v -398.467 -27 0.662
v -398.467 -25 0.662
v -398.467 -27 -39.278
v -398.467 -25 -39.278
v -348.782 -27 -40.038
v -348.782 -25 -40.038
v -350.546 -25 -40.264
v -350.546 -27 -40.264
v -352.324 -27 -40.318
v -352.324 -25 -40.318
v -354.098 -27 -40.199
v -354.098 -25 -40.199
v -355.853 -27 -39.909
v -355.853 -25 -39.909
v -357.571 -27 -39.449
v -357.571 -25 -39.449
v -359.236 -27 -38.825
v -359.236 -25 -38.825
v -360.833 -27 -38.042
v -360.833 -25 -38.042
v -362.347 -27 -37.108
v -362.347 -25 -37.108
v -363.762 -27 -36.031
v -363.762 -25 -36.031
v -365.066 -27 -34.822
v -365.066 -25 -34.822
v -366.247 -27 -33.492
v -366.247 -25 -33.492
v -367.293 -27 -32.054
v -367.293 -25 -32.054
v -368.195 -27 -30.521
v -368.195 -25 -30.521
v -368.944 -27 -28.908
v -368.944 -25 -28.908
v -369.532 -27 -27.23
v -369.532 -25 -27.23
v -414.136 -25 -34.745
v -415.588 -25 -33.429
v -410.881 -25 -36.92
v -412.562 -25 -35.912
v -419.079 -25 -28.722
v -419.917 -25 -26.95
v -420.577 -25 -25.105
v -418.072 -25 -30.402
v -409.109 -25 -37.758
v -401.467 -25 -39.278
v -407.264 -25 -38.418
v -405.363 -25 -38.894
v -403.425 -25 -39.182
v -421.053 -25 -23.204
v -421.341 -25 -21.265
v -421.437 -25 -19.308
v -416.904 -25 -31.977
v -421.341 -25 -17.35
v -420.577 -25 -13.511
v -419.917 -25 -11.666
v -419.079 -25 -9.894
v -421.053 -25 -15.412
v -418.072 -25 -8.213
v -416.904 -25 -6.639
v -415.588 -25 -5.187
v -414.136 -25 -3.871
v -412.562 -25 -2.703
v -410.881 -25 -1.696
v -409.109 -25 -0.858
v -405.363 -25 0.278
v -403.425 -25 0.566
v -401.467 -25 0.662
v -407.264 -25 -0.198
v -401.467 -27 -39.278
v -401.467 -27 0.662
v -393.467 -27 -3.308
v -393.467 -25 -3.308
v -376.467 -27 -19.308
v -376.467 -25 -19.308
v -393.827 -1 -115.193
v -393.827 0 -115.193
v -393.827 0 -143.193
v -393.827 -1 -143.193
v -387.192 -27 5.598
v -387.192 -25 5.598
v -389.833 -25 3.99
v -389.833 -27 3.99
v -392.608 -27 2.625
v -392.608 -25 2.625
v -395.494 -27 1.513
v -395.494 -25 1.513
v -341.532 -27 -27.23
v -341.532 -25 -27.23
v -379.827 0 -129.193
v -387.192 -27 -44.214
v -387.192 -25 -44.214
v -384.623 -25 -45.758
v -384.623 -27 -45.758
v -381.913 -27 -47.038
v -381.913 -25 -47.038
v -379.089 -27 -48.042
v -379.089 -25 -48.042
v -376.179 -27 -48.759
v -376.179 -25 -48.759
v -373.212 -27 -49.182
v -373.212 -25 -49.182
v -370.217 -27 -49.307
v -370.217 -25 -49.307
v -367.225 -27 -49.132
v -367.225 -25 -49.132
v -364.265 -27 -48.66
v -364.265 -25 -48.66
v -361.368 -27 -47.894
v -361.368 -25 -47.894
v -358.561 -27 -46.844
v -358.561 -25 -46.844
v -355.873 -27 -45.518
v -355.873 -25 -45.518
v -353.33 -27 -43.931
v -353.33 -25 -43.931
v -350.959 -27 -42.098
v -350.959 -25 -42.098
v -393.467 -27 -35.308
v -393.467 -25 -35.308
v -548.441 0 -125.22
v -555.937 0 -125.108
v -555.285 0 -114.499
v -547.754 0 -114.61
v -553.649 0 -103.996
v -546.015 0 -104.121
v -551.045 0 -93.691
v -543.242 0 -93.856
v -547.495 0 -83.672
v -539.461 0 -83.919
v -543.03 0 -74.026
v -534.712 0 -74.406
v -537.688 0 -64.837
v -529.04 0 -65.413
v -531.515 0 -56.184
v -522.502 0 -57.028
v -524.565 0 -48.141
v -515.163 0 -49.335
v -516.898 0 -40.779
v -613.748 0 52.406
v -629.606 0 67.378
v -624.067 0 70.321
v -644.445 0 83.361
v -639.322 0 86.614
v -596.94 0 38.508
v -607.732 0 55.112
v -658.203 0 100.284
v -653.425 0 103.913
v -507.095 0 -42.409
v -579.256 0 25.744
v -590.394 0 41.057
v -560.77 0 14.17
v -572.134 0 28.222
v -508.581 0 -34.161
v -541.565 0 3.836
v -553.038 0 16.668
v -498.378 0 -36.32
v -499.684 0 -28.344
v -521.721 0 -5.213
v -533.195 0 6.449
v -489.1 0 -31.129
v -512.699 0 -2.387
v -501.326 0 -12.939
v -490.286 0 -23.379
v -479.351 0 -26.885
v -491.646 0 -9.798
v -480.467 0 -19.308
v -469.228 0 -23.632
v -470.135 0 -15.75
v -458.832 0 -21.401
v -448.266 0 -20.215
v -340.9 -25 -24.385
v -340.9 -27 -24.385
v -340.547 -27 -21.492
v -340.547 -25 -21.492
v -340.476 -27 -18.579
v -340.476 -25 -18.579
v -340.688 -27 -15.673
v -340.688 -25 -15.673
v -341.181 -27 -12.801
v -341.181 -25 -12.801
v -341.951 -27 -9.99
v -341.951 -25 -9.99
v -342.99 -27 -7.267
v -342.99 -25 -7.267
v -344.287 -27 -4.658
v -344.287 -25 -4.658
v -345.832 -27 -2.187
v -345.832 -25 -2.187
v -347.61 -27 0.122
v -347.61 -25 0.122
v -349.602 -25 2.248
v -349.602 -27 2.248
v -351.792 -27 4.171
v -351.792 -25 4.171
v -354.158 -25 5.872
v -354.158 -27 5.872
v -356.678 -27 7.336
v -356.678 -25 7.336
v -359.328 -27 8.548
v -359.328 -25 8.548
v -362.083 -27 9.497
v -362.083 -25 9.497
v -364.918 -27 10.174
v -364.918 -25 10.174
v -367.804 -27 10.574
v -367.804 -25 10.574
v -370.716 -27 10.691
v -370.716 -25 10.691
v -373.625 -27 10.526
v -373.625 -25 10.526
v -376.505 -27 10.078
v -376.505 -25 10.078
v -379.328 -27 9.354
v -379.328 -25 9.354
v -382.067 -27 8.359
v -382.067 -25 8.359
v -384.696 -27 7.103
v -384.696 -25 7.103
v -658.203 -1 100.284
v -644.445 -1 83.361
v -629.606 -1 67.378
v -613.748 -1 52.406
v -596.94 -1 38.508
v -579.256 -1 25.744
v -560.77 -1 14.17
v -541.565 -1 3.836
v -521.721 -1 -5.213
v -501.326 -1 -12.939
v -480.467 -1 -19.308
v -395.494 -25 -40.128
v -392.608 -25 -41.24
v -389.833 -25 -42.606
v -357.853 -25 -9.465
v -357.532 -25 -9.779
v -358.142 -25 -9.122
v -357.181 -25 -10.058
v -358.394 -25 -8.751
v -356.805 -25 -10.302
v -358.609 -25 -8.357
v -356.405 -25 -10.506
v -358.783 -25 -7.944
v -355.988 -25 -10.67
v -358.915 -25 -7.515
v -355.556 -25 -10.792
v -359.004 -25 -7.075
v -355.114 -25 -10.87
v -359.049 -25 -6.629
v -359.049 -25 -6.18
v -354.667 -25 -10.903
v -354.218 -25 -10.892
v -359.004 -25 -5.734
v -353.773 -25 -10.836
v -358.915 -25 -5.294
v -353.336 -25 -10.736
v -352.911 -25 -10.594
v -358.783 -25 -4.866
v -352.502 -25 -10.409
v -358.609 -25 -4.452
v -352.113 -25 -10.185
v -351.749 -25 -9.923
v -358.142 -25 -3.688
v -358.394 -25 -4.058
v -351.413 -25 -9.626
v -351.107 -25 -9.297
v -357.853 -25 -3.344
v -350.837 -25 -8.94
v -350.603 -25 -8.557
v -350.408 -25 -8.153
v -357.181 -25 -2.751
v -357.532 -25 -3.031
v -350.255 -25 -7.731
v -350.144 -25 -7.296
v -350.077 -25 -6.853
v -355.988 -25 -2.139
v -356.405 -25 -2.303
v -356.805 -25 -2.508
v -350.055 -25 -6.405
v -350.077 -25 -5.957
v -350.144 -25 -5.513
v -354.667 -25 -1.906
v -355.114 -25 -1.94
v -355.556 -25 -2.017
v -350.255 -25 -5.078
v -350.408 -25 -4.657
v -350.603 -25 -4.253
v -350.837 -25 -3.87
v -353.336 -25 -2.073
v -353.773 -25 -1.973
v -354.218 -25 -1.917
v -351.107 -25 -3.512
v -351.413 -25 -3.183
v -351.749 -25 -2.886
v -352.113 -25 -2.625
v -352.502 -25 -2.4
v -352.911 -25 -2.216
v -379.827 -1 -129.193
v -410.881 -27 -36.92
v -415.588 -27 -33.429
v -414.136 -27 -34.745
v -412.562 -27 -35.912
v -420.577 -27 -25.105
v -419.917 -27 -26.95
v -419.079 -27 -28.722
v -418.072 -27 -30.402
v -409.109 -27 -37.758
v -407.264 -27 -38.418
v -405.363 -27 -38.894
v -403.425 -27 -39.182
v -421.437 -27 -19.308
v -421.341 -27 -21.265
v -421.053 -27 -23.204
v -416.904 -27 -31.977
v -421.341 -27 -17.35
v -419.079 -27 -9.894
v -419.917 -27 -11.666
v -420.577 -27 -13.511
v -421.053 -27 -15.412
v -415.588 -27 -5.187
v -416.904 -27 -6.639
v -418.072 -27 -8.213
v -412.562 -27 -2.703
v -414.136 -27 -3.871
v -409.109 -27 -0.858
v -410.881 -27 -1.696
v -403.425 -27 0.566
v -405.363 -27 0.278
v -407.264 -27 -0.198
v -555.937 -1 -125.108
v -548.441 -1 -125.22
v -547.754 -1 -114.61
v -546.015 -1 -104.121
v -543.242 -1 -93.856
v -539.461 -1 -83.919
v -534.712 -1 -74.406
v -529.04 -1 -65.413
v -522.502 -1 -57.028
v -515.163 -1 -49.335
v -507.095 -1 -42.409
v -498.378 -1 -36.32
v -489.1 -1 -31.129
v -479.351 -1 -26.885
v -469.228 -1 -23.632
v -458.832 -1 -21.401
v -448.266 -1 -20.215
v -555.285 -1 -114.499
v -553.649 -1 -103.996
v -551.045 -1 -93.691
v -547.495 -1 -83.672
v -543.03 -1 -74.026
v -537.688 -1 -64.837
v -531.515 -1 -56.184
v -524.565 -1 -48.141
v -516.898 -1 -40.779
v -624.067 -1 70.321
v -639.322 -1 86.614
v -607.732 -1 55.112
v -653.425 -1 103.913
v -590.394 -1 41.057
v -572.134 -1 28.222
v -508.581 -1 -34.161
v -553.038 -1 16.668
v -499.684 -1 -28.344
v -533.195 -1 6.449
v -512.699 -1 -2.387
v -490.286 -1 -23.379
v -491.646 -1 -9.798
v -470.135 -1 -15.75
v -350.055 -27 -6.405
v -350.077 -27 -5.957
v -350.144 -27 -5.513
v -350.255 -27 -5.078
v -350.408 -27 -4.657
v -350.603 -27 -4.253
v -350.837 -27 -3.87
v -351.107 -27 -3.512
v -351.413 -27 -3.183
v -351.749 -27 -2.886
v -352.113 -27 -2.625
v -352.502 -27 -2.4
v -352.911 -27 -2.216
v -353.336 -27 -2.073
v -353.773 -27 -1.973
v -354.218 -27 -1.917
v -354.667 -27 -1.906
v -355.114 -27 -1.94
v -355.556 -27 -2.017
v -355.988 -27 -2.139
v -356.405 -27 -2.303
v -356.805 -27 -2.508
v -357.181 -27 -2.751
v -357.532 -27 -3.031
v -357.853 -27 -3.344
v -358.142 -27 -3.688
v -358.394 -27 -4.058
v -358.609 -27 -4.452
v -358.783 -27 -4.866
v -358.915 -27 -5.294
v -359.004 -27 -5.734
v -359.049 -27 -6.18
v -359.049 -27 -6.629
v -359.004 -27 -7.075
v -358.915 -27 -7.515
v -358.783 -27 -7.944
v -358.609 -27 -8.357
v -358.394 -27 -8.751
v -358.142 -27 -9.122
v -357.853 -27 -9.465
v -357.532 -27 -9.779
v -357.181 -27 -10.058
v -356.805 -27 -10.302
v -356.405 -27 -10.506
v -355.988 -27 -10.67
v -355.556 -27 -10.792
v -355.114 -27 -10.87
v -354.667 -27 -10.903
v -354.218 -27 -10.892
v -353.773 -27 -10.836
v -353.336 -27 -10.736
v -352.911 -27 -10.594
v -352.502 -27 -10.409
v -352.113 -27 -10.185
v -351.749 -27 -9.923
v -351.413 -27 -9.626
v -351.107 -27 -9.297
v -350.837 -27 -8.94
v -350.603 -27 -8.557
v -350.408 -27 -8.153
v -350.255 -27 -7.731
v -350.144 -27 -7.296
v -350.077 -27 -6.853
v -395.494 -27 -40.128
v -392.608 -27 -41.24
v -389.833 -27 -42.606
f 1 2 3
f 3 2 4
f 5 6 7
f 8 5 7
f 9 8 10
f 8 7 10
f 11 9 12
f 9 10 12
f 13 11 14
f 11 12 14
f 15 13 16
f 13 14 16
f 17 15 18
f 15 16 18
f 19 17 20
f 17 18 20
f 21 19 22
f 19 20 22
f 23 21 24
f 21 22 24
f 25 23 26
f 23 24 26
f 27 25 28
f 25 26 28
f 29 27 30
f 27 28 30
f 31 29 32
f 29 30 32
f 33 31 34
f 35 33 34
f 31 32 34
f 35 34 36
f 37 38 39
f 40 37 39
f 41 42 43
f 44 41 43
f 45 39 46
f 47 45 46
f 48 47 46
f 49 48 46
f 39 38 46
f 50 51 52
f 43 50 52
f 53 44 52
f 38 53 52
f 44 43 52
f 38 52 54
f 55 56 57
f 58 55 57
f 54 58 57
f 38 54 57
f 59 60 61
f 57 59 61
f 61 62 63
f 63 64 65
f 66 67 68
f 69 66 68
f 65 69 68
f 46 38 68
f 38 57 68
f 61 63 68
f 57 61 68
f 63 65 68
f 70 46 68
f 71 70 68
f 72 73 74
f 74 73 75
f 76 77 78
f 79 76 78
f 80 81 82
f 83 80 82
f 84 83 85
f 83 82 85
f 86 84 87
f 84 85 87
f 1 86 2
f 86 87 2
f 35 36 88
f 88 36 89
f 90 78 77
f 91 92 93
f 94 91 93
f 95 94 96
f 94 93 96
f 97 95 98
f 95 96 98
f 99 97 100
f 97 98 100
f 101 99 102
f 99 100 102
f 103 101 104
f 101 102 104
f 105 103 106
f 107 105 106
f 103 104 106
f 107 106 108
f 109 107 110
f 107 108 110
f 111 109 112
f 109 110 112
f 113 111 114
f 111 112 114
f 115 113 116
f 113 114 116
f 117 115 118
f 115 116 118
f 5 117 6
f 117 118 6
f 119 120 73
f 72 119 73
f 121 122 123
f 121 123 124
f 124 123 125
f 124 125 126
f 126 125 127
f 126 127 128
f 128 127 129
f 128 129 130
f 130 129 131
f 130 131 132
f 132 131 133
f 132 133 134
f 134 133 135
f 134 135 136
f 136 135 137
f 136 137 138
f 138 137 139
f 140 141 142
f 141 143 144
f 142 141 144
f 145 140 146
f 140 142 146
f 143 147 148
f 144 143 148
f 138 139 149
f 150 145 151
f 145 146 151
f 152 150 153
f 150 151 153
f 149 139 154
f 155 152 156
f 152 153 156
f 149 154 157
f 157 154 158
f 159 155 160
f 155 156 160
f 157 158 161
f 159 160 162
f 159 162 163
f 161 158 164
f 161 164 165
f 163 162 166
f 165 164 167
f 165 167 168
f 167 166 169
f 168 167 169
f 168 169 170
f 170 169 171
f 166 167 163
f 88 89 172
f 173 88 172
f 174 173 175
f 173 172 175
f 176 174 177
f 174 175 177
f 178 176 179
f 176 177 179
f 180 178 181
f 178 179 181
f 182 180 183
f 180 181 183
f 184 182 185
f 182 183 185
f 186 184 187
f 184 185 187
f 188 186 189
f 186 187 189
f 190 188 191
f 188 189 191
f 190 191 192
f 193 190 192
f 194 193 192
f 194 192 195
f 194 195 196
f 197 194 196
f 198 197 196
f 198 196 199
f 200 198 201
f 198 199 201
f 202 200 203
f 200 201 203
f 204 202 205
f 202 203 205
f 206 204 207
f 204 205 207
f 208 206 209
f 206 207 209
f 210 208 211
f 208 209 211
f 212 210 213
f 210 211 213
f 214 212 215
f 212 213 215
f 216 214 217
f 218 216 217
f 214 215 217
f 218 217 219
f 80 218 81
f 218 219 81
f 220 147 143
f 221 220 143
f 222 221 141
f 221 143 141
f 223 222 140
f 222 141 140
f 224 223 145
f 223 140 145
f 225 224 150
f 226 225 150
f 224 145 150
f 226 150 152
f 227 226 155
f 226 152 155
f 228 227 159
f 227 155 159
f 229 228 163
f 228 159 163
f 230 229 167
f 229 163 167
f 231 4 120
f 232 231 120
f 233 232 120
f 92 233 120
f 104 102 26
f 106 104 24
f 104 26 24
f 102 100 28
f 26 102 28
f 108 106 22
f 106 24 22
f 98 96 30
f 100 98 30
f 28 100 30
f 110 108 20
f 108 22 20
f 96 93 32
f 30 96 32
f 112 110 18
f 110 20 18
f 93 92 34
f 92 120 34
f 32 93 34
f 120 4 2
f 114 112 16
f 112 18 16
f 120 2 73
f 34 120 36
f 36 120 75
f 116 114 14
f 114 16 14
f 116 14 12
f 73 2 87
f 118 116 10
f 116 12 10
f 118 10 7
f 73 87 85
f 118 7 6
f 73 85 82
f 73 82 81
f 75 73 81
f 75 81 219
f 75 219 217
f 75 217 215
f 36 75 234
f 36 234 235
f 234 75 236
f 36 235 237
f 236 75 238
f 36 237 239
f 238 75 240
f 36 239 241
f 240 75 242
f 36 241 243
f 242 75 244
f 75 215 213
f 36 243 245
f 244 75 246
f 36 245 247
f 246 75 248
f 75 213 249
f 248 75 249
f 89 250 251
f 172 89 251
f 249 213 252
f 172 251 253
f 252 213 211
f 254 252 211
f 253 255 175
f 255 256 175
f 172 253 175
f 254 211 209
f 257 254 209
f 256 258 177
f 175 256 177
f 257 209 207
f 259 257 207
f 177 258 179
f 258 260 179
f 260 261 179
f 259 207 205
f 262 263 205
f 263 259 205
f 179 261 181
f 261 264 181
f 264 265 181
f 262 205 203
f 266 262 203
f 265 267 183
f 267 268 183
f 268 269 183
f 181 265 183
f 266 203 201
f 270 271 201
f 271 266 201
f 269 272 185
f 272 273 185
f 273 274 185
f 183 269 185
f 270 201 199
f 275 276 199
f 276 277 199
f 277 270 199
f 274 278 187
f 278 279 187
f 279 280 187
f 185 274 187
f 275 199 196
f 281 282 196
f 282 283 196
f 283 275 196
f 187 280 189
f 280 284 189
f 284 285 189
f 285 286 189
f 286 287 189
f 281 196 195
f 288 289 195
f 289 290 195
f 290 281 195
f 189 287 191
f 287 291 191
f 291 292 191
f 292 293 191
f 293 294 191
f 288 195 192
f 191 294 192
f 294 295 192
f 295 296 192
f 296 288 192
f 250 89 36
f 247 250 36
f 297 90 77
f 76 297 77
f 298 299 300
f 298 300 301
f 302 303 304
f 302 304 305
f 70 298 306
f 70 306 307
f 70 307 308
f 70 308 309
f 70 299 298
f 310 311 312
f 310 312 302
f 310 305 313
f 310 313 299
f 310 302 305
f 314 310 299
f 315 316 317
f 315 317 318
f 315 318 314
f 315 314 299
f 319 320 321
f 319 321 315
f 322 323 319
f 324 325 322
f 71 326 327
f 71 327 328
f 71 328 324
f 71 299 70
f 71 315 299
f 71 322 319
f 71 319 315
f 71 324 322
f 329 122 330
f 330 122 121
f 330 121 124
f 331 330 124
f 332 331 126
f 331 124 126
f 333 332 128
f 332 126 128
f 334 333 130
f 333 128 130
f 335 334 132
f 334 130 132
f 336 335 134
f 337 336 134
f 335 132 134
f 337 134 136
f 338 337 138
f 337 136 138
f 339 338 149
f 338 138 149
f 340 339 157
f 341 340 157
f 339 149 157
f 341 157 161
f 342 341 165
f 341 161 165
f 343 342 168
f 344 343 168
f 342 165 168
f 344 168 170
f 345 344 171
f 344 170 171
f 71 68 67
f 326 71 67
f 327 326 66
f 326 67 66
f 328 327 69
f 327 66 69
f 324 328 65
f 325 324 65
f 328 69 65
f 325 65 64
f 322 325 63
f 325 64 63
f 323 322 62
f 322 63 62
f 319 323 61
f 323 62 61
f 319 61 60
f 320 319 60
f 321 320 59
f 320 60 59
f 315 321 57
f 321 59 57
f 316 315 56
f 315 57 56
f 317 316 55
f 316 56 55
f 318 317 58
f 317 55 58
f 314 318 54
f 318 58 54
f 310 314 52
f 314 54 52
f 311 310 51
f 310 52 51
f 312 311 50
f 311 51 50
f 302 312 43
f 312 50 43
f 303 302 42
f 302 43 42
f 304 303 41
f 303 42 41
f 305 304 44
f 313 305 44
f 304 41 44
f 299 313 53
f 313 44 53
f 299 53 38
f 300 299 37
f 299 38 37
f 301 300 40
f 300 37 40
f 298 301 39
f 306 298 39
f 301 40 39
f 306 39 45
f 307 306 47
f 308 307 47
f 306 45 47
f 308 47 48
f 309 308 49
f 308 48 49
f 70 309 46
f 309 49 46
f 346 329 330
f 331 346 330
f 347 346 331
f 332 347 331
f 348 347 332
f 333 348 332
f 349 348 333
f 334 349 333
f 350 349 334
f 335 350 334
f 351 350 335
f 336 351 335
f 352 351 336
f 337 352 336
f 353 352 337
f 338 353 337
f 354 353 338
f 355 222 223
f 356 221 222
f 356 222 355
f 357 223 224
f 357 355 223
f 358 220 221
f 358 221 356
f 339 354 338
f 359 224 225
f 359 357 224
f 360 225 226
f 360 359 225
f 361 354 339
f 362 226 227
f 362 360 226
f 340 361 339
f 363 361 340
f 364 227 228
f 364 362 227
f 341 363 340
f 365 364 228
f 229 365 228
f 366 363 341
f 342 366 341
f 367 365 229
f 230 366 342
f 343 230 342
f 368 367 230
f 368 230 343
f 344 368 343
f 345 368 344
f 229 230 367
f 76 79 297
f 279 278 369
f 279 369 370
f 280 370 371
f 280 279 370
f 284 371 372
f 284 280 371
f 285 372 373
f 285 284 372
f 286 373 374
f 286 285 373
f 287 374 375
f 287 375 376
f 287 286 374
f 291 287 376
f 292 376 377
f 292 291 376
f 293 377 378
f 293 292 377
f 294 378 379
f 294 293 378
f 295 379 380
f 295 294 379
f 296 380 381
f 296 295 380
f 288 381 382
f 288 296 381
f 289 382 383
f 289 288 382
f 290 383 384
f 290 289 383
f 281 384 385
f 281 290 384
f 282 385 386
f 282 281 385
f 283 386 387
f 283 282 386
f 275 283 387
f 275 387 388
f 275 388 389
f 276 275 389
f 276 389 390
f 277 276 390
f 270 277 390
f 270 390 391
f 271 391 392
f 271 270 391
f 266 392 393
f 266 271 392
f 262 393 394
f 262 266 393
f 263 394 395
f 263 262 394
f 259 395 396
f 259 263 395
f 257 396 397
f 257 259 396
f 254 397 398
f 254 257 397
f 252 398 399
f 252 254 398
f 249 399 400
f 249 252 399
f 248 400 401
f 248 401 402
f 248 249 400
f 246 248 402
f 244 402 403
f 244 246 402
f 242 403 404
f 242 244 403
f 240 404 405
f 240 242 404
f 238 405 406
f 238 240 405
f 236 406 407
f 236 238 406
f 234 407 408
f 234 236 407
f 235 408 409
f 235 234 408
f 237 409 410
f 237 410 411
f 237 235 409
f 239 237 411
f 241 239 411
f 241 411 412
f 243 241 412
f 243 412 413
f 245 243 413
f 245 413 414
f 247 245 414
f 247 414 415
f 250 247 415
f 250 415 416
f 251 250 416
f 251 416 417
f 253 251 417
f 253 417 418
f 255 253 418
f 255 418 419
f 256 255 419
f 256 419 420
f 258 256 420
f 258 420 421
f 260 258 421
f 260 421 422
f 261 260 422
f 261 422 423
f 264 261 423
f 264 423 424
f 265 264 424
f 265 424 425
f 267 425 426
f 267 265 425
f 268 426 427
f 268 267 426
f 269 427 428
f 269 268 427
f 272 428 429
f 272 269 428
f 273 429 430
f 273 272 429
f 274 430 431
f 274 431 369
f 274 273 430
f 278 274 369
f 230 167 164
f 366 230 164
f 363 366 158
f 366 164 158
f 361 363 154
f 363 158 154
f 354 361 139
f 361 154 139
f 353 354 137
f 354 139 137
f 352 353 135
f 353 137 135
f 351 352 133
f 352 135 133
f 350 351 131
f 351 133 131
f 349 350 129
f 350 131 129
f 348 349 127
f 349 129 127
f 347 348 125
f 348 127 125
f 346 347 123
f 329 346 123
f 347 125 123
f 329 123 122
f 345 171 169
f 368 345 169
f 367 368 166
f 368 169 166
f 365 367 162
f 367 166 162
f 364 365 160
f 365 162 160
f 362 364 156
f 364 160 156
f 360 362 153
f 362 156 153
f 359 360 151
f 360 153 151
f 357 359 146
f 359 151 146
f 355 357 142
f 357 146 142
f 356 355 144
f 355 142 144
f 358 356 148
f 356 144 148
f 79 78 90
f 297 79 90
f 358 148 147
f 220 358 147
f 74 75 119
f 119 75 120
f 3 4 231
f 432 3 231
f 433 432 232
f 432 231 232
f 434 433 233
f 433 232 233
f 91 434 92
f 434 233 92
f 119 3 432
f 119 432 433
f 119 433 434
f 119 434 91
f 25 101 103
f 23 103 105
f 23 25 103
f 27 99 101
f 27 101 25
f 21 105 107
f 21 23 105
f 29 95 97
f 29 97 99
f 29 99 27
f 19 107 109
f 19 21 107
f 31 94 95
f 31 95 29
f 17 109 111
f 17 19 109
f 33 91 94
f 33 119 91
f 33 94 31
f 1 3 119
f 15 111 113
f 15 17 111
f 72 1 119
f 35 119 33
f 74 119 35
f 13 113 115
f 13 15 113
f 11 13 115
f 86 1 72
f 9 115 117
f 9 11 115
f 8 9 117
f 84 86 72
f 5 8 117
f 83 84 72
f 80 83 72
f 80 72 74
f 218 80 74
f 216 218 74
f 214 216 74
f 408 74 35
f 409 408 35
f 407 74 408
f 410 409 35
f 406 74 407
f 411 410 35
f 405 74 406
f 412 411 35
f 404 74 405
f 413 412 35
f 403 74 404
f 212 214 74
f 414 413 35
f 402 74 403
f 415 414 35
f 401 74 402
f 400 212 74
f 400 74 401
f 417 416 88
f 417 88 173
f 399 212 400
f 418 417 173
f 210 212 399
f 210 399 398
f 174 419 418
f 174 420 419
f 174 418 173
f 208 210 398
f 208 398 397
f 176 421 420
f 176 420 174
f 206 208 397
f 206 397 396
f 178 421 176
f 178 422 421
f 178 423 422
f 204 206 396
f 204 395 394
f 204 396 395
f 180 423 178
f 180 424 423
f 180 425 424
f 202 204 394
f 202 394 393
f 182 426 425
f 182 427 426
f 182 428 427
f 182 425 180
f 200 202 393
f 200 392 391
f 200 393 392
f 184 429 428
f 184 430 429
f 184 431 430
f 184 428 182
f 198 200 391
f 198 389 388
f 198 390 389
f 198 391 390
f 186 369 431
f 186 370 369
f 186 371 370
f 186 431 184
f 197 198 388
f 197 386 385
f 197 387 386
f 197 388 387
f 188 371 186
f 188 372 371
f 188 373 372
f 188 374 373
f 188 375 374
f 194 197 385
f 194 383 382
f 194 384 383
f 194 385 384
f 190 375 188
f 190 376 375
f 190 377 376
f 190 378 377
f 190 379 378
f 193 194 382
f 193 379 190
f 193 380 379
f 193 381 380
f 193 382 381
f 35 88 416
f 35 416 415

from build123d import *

# Parameters (mm, degrees)
F5_R     = 4.5
F6_DEPTH = 2
F8_DEPTH = 1
F9_DEPTH = 1


# Not quite as in the source:
# - a feature names something its author has since deleted; it is built from what else it names


with BuildPart() as f6:
    # F5 (on offset) → F6 (new body)
    with BuildSketch(Plane.XZ.offset(25)):
        with BuildLine():
            ThreePointArc((-398.467205436, -39.2777054383), (-392.6082274756, -41.2404384818), (-387.1915217022, -44.2135248081))
            ThreePointArc((-387.1915217022, -44.2135248081), (-367.2251337414, -49.1320591827), (-348.7819741916, -40.0381879271))
            ThreePointArc((-348.7819741916, -40.0381879271), (-361.6011790718, -37.5934442718), (-369.5320105339, -27.229531033))
            Line((-369.5320105339, -27.229531033), (-341.5320105339, -27.229531033))
            ThreePointArc((-341.5320105339, -27.229531033), (-352.9546885172, 5.0502340302), (-387.1915217022, 5.598009817))
            ThreePointArc((-387.1915217022, 5.598009817), (-392.6082274756, 2.6249234907), (-398.467205436, 0.6621904472))
            Line((-398.467205436, 0.6621904472), (-398.467205436, -39.2777054383))
        make_face()
        Polygon((-393.467205436, -3.3077574955), (-376.467205436, -19.3077574955), (-393.467205436, -35.3077574955), (-393.467205436, -19.3077574955), align=None, mode=Mode.SUBTRACT)
        with Locations((-354.5545938938, -6.4046481277)):
            Circle(F5_R, mode=Mode.SUBTRACT)
    extrude(amount=F6_DEPTH)


with BuildPart() as f6b:
    # F5 (on offset) → F6, piece 2 (new body)
    with BuildSketch(Plane.XZ.offset(25)):
        with BuildLine():
            Line((-401.467205436, -39.2777054383), (-401.467205436, 0.6621904472))
            ThreePointArc((-401.467205436, 0.6621904472), (-421.4371533787, -19.3077574955), (-401.467205436, -39.2777054383))
        make_face()
    extrude(amount=F6_DEPTH)


with BuildPart() as f8:
    # F7 (on Front) → F8 (new body)
    with BuildSketch(Plane.XZ):
        with BuildLine():
            Line((-653.4249486684, 103.9134022917), (-658.2025638487, 100.2837475989))
            ThreePointArc((-658.2025638487, 100.2837475989), (-579.2555377986, 25.744047787), (-480.467205436, -19.3077574955))
            ThreePointArc((-480.467205436, -19.3077574955), (-534.7020128056, -60.4384507793), (-555.9372290567, -125.1084890597))
            Line((-555.9372290567, -125.1084890597), (-548.4414986364, -125.2204015407))
            ThreePointArc((-548.4414986364, -125.2204015407), (-518.9281051059, -53.0898043717), (-448.2662559395, -20.2147907898))
            ThreePointArc((-448.2662559395, -20.2147907898), (-562.684901543, 22.2813486703), (-653.4249486684, 103.9134022917))
        make_face()
    extrude(amount=F8_DEPTH)

    # F7 (on Front) → F9 (join)
    with BuildSketch(Plane.XZ):
        with BuildLine():
            Line((-653.4249486684, 103.9134022917), (-658.2025638487, 100.2837475989))
            ThreePointArc((-658.2025638487, 100.2837475989), (-579.2555377986, 25.744047787), (-480.467205436, -19.3077574955))
            ThreePointArc((-480.467205436, -19.3077574955), (-534.7020128056, -60.4384507793), (-555.9372290567, -125.1084890597))
            Line((-555.9372290567, -125.1084890597), (-548.4414986364, -125.2204015407))
            ThreePointArc((-548.4414986364, -125.2204015407), (-518.9281051059, -53.0898043717), (-448.2662559395, -20.2147907898))
            ThreePointArc((-448.2662559395, -20.2147907898), (-562.684901543, 22.2813486703), (-653.4249486684, 103.9134022917))
        make_face()
    extrude(amount=F9_DEPTH)


with BuildPart() as f9:
    # F7 (on Front) → F9, piece 2 (new body)
    with BuildSketch(Plane.XZ):
        Polygon((-379.8274085522, -129.1934684515), (-393.8274085522, -115.1934684515), (-393.8274085522, -143.1934684515), align=None)
    extrude(amount=F9_DEPTH)


solid = Compound([f6.part, f6b.part, f8.part, f9.part])
